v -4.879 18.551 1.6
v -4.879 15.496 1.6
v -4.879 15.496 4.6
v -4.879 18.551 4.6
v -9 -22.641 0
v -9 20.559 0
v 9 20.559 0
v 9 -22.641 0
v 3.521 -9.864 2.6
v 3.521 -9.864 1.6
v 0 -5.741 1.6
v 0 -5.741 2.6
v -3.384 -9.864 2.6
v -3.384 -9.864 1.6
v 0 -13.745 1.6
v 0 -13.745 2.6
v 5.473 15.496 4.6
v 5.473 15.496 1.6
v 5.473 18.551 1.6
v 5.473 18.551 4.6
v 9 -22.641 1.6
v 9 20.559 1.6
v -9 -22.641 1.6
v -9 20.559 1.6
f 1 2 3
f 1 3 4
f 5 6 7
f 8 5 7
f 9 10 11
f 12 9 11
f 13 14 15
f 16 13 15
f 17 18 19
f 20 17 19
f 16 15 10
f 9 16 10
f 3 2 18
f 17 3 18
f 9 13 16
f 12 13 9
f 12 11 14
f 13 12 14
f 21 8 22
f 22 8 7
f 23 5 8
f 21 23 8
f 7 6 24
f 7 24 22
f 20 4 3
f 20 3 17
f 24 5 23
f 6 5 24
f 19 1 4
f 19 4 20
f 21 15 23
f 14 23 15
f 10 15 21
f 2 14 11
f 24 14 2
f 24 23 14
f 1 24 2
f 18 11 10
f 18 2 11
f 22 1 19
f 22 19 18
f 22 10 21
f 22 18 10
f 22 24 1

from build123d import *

# Parameters (mm, degrees)
F0_W     = 18
F0_H     = 43.2
F1_DEPTH = 1.6
F3_DEPTH = 1
F2_W     = 10.35191
F2_H     = 3.05466
F4_DEPTH = 3


with BuildPart() as f1:
    # F0 (on Top) → F1 (new body)
    with BuildSketch(Plane.XY):
        with Locations((0, -1.040964)):
            Rectangle(F0_W, F0_H)
    extrude(amount=F1_DEPTH)

    # F2 (on face) → F3 (join)
    with BuildSketch(Plane.XY.offset(1.6)):
        Polygon((-3.383941, -9.864242), (0, -13.744771), (3.521491, -9.864242), (0, -5.74118), align=None)
    extrude(amount=F3_DEPTH)

    # F2 (on face) → F4 (join)
    with BuildSketch(Plane.XY.offset(1.6)):
        with Locations((0.296766, 17.023522)):
            Rectangle(F2_W, F2_H)
    extrude(amount=F4_DEPTH)


solid = f1.part
